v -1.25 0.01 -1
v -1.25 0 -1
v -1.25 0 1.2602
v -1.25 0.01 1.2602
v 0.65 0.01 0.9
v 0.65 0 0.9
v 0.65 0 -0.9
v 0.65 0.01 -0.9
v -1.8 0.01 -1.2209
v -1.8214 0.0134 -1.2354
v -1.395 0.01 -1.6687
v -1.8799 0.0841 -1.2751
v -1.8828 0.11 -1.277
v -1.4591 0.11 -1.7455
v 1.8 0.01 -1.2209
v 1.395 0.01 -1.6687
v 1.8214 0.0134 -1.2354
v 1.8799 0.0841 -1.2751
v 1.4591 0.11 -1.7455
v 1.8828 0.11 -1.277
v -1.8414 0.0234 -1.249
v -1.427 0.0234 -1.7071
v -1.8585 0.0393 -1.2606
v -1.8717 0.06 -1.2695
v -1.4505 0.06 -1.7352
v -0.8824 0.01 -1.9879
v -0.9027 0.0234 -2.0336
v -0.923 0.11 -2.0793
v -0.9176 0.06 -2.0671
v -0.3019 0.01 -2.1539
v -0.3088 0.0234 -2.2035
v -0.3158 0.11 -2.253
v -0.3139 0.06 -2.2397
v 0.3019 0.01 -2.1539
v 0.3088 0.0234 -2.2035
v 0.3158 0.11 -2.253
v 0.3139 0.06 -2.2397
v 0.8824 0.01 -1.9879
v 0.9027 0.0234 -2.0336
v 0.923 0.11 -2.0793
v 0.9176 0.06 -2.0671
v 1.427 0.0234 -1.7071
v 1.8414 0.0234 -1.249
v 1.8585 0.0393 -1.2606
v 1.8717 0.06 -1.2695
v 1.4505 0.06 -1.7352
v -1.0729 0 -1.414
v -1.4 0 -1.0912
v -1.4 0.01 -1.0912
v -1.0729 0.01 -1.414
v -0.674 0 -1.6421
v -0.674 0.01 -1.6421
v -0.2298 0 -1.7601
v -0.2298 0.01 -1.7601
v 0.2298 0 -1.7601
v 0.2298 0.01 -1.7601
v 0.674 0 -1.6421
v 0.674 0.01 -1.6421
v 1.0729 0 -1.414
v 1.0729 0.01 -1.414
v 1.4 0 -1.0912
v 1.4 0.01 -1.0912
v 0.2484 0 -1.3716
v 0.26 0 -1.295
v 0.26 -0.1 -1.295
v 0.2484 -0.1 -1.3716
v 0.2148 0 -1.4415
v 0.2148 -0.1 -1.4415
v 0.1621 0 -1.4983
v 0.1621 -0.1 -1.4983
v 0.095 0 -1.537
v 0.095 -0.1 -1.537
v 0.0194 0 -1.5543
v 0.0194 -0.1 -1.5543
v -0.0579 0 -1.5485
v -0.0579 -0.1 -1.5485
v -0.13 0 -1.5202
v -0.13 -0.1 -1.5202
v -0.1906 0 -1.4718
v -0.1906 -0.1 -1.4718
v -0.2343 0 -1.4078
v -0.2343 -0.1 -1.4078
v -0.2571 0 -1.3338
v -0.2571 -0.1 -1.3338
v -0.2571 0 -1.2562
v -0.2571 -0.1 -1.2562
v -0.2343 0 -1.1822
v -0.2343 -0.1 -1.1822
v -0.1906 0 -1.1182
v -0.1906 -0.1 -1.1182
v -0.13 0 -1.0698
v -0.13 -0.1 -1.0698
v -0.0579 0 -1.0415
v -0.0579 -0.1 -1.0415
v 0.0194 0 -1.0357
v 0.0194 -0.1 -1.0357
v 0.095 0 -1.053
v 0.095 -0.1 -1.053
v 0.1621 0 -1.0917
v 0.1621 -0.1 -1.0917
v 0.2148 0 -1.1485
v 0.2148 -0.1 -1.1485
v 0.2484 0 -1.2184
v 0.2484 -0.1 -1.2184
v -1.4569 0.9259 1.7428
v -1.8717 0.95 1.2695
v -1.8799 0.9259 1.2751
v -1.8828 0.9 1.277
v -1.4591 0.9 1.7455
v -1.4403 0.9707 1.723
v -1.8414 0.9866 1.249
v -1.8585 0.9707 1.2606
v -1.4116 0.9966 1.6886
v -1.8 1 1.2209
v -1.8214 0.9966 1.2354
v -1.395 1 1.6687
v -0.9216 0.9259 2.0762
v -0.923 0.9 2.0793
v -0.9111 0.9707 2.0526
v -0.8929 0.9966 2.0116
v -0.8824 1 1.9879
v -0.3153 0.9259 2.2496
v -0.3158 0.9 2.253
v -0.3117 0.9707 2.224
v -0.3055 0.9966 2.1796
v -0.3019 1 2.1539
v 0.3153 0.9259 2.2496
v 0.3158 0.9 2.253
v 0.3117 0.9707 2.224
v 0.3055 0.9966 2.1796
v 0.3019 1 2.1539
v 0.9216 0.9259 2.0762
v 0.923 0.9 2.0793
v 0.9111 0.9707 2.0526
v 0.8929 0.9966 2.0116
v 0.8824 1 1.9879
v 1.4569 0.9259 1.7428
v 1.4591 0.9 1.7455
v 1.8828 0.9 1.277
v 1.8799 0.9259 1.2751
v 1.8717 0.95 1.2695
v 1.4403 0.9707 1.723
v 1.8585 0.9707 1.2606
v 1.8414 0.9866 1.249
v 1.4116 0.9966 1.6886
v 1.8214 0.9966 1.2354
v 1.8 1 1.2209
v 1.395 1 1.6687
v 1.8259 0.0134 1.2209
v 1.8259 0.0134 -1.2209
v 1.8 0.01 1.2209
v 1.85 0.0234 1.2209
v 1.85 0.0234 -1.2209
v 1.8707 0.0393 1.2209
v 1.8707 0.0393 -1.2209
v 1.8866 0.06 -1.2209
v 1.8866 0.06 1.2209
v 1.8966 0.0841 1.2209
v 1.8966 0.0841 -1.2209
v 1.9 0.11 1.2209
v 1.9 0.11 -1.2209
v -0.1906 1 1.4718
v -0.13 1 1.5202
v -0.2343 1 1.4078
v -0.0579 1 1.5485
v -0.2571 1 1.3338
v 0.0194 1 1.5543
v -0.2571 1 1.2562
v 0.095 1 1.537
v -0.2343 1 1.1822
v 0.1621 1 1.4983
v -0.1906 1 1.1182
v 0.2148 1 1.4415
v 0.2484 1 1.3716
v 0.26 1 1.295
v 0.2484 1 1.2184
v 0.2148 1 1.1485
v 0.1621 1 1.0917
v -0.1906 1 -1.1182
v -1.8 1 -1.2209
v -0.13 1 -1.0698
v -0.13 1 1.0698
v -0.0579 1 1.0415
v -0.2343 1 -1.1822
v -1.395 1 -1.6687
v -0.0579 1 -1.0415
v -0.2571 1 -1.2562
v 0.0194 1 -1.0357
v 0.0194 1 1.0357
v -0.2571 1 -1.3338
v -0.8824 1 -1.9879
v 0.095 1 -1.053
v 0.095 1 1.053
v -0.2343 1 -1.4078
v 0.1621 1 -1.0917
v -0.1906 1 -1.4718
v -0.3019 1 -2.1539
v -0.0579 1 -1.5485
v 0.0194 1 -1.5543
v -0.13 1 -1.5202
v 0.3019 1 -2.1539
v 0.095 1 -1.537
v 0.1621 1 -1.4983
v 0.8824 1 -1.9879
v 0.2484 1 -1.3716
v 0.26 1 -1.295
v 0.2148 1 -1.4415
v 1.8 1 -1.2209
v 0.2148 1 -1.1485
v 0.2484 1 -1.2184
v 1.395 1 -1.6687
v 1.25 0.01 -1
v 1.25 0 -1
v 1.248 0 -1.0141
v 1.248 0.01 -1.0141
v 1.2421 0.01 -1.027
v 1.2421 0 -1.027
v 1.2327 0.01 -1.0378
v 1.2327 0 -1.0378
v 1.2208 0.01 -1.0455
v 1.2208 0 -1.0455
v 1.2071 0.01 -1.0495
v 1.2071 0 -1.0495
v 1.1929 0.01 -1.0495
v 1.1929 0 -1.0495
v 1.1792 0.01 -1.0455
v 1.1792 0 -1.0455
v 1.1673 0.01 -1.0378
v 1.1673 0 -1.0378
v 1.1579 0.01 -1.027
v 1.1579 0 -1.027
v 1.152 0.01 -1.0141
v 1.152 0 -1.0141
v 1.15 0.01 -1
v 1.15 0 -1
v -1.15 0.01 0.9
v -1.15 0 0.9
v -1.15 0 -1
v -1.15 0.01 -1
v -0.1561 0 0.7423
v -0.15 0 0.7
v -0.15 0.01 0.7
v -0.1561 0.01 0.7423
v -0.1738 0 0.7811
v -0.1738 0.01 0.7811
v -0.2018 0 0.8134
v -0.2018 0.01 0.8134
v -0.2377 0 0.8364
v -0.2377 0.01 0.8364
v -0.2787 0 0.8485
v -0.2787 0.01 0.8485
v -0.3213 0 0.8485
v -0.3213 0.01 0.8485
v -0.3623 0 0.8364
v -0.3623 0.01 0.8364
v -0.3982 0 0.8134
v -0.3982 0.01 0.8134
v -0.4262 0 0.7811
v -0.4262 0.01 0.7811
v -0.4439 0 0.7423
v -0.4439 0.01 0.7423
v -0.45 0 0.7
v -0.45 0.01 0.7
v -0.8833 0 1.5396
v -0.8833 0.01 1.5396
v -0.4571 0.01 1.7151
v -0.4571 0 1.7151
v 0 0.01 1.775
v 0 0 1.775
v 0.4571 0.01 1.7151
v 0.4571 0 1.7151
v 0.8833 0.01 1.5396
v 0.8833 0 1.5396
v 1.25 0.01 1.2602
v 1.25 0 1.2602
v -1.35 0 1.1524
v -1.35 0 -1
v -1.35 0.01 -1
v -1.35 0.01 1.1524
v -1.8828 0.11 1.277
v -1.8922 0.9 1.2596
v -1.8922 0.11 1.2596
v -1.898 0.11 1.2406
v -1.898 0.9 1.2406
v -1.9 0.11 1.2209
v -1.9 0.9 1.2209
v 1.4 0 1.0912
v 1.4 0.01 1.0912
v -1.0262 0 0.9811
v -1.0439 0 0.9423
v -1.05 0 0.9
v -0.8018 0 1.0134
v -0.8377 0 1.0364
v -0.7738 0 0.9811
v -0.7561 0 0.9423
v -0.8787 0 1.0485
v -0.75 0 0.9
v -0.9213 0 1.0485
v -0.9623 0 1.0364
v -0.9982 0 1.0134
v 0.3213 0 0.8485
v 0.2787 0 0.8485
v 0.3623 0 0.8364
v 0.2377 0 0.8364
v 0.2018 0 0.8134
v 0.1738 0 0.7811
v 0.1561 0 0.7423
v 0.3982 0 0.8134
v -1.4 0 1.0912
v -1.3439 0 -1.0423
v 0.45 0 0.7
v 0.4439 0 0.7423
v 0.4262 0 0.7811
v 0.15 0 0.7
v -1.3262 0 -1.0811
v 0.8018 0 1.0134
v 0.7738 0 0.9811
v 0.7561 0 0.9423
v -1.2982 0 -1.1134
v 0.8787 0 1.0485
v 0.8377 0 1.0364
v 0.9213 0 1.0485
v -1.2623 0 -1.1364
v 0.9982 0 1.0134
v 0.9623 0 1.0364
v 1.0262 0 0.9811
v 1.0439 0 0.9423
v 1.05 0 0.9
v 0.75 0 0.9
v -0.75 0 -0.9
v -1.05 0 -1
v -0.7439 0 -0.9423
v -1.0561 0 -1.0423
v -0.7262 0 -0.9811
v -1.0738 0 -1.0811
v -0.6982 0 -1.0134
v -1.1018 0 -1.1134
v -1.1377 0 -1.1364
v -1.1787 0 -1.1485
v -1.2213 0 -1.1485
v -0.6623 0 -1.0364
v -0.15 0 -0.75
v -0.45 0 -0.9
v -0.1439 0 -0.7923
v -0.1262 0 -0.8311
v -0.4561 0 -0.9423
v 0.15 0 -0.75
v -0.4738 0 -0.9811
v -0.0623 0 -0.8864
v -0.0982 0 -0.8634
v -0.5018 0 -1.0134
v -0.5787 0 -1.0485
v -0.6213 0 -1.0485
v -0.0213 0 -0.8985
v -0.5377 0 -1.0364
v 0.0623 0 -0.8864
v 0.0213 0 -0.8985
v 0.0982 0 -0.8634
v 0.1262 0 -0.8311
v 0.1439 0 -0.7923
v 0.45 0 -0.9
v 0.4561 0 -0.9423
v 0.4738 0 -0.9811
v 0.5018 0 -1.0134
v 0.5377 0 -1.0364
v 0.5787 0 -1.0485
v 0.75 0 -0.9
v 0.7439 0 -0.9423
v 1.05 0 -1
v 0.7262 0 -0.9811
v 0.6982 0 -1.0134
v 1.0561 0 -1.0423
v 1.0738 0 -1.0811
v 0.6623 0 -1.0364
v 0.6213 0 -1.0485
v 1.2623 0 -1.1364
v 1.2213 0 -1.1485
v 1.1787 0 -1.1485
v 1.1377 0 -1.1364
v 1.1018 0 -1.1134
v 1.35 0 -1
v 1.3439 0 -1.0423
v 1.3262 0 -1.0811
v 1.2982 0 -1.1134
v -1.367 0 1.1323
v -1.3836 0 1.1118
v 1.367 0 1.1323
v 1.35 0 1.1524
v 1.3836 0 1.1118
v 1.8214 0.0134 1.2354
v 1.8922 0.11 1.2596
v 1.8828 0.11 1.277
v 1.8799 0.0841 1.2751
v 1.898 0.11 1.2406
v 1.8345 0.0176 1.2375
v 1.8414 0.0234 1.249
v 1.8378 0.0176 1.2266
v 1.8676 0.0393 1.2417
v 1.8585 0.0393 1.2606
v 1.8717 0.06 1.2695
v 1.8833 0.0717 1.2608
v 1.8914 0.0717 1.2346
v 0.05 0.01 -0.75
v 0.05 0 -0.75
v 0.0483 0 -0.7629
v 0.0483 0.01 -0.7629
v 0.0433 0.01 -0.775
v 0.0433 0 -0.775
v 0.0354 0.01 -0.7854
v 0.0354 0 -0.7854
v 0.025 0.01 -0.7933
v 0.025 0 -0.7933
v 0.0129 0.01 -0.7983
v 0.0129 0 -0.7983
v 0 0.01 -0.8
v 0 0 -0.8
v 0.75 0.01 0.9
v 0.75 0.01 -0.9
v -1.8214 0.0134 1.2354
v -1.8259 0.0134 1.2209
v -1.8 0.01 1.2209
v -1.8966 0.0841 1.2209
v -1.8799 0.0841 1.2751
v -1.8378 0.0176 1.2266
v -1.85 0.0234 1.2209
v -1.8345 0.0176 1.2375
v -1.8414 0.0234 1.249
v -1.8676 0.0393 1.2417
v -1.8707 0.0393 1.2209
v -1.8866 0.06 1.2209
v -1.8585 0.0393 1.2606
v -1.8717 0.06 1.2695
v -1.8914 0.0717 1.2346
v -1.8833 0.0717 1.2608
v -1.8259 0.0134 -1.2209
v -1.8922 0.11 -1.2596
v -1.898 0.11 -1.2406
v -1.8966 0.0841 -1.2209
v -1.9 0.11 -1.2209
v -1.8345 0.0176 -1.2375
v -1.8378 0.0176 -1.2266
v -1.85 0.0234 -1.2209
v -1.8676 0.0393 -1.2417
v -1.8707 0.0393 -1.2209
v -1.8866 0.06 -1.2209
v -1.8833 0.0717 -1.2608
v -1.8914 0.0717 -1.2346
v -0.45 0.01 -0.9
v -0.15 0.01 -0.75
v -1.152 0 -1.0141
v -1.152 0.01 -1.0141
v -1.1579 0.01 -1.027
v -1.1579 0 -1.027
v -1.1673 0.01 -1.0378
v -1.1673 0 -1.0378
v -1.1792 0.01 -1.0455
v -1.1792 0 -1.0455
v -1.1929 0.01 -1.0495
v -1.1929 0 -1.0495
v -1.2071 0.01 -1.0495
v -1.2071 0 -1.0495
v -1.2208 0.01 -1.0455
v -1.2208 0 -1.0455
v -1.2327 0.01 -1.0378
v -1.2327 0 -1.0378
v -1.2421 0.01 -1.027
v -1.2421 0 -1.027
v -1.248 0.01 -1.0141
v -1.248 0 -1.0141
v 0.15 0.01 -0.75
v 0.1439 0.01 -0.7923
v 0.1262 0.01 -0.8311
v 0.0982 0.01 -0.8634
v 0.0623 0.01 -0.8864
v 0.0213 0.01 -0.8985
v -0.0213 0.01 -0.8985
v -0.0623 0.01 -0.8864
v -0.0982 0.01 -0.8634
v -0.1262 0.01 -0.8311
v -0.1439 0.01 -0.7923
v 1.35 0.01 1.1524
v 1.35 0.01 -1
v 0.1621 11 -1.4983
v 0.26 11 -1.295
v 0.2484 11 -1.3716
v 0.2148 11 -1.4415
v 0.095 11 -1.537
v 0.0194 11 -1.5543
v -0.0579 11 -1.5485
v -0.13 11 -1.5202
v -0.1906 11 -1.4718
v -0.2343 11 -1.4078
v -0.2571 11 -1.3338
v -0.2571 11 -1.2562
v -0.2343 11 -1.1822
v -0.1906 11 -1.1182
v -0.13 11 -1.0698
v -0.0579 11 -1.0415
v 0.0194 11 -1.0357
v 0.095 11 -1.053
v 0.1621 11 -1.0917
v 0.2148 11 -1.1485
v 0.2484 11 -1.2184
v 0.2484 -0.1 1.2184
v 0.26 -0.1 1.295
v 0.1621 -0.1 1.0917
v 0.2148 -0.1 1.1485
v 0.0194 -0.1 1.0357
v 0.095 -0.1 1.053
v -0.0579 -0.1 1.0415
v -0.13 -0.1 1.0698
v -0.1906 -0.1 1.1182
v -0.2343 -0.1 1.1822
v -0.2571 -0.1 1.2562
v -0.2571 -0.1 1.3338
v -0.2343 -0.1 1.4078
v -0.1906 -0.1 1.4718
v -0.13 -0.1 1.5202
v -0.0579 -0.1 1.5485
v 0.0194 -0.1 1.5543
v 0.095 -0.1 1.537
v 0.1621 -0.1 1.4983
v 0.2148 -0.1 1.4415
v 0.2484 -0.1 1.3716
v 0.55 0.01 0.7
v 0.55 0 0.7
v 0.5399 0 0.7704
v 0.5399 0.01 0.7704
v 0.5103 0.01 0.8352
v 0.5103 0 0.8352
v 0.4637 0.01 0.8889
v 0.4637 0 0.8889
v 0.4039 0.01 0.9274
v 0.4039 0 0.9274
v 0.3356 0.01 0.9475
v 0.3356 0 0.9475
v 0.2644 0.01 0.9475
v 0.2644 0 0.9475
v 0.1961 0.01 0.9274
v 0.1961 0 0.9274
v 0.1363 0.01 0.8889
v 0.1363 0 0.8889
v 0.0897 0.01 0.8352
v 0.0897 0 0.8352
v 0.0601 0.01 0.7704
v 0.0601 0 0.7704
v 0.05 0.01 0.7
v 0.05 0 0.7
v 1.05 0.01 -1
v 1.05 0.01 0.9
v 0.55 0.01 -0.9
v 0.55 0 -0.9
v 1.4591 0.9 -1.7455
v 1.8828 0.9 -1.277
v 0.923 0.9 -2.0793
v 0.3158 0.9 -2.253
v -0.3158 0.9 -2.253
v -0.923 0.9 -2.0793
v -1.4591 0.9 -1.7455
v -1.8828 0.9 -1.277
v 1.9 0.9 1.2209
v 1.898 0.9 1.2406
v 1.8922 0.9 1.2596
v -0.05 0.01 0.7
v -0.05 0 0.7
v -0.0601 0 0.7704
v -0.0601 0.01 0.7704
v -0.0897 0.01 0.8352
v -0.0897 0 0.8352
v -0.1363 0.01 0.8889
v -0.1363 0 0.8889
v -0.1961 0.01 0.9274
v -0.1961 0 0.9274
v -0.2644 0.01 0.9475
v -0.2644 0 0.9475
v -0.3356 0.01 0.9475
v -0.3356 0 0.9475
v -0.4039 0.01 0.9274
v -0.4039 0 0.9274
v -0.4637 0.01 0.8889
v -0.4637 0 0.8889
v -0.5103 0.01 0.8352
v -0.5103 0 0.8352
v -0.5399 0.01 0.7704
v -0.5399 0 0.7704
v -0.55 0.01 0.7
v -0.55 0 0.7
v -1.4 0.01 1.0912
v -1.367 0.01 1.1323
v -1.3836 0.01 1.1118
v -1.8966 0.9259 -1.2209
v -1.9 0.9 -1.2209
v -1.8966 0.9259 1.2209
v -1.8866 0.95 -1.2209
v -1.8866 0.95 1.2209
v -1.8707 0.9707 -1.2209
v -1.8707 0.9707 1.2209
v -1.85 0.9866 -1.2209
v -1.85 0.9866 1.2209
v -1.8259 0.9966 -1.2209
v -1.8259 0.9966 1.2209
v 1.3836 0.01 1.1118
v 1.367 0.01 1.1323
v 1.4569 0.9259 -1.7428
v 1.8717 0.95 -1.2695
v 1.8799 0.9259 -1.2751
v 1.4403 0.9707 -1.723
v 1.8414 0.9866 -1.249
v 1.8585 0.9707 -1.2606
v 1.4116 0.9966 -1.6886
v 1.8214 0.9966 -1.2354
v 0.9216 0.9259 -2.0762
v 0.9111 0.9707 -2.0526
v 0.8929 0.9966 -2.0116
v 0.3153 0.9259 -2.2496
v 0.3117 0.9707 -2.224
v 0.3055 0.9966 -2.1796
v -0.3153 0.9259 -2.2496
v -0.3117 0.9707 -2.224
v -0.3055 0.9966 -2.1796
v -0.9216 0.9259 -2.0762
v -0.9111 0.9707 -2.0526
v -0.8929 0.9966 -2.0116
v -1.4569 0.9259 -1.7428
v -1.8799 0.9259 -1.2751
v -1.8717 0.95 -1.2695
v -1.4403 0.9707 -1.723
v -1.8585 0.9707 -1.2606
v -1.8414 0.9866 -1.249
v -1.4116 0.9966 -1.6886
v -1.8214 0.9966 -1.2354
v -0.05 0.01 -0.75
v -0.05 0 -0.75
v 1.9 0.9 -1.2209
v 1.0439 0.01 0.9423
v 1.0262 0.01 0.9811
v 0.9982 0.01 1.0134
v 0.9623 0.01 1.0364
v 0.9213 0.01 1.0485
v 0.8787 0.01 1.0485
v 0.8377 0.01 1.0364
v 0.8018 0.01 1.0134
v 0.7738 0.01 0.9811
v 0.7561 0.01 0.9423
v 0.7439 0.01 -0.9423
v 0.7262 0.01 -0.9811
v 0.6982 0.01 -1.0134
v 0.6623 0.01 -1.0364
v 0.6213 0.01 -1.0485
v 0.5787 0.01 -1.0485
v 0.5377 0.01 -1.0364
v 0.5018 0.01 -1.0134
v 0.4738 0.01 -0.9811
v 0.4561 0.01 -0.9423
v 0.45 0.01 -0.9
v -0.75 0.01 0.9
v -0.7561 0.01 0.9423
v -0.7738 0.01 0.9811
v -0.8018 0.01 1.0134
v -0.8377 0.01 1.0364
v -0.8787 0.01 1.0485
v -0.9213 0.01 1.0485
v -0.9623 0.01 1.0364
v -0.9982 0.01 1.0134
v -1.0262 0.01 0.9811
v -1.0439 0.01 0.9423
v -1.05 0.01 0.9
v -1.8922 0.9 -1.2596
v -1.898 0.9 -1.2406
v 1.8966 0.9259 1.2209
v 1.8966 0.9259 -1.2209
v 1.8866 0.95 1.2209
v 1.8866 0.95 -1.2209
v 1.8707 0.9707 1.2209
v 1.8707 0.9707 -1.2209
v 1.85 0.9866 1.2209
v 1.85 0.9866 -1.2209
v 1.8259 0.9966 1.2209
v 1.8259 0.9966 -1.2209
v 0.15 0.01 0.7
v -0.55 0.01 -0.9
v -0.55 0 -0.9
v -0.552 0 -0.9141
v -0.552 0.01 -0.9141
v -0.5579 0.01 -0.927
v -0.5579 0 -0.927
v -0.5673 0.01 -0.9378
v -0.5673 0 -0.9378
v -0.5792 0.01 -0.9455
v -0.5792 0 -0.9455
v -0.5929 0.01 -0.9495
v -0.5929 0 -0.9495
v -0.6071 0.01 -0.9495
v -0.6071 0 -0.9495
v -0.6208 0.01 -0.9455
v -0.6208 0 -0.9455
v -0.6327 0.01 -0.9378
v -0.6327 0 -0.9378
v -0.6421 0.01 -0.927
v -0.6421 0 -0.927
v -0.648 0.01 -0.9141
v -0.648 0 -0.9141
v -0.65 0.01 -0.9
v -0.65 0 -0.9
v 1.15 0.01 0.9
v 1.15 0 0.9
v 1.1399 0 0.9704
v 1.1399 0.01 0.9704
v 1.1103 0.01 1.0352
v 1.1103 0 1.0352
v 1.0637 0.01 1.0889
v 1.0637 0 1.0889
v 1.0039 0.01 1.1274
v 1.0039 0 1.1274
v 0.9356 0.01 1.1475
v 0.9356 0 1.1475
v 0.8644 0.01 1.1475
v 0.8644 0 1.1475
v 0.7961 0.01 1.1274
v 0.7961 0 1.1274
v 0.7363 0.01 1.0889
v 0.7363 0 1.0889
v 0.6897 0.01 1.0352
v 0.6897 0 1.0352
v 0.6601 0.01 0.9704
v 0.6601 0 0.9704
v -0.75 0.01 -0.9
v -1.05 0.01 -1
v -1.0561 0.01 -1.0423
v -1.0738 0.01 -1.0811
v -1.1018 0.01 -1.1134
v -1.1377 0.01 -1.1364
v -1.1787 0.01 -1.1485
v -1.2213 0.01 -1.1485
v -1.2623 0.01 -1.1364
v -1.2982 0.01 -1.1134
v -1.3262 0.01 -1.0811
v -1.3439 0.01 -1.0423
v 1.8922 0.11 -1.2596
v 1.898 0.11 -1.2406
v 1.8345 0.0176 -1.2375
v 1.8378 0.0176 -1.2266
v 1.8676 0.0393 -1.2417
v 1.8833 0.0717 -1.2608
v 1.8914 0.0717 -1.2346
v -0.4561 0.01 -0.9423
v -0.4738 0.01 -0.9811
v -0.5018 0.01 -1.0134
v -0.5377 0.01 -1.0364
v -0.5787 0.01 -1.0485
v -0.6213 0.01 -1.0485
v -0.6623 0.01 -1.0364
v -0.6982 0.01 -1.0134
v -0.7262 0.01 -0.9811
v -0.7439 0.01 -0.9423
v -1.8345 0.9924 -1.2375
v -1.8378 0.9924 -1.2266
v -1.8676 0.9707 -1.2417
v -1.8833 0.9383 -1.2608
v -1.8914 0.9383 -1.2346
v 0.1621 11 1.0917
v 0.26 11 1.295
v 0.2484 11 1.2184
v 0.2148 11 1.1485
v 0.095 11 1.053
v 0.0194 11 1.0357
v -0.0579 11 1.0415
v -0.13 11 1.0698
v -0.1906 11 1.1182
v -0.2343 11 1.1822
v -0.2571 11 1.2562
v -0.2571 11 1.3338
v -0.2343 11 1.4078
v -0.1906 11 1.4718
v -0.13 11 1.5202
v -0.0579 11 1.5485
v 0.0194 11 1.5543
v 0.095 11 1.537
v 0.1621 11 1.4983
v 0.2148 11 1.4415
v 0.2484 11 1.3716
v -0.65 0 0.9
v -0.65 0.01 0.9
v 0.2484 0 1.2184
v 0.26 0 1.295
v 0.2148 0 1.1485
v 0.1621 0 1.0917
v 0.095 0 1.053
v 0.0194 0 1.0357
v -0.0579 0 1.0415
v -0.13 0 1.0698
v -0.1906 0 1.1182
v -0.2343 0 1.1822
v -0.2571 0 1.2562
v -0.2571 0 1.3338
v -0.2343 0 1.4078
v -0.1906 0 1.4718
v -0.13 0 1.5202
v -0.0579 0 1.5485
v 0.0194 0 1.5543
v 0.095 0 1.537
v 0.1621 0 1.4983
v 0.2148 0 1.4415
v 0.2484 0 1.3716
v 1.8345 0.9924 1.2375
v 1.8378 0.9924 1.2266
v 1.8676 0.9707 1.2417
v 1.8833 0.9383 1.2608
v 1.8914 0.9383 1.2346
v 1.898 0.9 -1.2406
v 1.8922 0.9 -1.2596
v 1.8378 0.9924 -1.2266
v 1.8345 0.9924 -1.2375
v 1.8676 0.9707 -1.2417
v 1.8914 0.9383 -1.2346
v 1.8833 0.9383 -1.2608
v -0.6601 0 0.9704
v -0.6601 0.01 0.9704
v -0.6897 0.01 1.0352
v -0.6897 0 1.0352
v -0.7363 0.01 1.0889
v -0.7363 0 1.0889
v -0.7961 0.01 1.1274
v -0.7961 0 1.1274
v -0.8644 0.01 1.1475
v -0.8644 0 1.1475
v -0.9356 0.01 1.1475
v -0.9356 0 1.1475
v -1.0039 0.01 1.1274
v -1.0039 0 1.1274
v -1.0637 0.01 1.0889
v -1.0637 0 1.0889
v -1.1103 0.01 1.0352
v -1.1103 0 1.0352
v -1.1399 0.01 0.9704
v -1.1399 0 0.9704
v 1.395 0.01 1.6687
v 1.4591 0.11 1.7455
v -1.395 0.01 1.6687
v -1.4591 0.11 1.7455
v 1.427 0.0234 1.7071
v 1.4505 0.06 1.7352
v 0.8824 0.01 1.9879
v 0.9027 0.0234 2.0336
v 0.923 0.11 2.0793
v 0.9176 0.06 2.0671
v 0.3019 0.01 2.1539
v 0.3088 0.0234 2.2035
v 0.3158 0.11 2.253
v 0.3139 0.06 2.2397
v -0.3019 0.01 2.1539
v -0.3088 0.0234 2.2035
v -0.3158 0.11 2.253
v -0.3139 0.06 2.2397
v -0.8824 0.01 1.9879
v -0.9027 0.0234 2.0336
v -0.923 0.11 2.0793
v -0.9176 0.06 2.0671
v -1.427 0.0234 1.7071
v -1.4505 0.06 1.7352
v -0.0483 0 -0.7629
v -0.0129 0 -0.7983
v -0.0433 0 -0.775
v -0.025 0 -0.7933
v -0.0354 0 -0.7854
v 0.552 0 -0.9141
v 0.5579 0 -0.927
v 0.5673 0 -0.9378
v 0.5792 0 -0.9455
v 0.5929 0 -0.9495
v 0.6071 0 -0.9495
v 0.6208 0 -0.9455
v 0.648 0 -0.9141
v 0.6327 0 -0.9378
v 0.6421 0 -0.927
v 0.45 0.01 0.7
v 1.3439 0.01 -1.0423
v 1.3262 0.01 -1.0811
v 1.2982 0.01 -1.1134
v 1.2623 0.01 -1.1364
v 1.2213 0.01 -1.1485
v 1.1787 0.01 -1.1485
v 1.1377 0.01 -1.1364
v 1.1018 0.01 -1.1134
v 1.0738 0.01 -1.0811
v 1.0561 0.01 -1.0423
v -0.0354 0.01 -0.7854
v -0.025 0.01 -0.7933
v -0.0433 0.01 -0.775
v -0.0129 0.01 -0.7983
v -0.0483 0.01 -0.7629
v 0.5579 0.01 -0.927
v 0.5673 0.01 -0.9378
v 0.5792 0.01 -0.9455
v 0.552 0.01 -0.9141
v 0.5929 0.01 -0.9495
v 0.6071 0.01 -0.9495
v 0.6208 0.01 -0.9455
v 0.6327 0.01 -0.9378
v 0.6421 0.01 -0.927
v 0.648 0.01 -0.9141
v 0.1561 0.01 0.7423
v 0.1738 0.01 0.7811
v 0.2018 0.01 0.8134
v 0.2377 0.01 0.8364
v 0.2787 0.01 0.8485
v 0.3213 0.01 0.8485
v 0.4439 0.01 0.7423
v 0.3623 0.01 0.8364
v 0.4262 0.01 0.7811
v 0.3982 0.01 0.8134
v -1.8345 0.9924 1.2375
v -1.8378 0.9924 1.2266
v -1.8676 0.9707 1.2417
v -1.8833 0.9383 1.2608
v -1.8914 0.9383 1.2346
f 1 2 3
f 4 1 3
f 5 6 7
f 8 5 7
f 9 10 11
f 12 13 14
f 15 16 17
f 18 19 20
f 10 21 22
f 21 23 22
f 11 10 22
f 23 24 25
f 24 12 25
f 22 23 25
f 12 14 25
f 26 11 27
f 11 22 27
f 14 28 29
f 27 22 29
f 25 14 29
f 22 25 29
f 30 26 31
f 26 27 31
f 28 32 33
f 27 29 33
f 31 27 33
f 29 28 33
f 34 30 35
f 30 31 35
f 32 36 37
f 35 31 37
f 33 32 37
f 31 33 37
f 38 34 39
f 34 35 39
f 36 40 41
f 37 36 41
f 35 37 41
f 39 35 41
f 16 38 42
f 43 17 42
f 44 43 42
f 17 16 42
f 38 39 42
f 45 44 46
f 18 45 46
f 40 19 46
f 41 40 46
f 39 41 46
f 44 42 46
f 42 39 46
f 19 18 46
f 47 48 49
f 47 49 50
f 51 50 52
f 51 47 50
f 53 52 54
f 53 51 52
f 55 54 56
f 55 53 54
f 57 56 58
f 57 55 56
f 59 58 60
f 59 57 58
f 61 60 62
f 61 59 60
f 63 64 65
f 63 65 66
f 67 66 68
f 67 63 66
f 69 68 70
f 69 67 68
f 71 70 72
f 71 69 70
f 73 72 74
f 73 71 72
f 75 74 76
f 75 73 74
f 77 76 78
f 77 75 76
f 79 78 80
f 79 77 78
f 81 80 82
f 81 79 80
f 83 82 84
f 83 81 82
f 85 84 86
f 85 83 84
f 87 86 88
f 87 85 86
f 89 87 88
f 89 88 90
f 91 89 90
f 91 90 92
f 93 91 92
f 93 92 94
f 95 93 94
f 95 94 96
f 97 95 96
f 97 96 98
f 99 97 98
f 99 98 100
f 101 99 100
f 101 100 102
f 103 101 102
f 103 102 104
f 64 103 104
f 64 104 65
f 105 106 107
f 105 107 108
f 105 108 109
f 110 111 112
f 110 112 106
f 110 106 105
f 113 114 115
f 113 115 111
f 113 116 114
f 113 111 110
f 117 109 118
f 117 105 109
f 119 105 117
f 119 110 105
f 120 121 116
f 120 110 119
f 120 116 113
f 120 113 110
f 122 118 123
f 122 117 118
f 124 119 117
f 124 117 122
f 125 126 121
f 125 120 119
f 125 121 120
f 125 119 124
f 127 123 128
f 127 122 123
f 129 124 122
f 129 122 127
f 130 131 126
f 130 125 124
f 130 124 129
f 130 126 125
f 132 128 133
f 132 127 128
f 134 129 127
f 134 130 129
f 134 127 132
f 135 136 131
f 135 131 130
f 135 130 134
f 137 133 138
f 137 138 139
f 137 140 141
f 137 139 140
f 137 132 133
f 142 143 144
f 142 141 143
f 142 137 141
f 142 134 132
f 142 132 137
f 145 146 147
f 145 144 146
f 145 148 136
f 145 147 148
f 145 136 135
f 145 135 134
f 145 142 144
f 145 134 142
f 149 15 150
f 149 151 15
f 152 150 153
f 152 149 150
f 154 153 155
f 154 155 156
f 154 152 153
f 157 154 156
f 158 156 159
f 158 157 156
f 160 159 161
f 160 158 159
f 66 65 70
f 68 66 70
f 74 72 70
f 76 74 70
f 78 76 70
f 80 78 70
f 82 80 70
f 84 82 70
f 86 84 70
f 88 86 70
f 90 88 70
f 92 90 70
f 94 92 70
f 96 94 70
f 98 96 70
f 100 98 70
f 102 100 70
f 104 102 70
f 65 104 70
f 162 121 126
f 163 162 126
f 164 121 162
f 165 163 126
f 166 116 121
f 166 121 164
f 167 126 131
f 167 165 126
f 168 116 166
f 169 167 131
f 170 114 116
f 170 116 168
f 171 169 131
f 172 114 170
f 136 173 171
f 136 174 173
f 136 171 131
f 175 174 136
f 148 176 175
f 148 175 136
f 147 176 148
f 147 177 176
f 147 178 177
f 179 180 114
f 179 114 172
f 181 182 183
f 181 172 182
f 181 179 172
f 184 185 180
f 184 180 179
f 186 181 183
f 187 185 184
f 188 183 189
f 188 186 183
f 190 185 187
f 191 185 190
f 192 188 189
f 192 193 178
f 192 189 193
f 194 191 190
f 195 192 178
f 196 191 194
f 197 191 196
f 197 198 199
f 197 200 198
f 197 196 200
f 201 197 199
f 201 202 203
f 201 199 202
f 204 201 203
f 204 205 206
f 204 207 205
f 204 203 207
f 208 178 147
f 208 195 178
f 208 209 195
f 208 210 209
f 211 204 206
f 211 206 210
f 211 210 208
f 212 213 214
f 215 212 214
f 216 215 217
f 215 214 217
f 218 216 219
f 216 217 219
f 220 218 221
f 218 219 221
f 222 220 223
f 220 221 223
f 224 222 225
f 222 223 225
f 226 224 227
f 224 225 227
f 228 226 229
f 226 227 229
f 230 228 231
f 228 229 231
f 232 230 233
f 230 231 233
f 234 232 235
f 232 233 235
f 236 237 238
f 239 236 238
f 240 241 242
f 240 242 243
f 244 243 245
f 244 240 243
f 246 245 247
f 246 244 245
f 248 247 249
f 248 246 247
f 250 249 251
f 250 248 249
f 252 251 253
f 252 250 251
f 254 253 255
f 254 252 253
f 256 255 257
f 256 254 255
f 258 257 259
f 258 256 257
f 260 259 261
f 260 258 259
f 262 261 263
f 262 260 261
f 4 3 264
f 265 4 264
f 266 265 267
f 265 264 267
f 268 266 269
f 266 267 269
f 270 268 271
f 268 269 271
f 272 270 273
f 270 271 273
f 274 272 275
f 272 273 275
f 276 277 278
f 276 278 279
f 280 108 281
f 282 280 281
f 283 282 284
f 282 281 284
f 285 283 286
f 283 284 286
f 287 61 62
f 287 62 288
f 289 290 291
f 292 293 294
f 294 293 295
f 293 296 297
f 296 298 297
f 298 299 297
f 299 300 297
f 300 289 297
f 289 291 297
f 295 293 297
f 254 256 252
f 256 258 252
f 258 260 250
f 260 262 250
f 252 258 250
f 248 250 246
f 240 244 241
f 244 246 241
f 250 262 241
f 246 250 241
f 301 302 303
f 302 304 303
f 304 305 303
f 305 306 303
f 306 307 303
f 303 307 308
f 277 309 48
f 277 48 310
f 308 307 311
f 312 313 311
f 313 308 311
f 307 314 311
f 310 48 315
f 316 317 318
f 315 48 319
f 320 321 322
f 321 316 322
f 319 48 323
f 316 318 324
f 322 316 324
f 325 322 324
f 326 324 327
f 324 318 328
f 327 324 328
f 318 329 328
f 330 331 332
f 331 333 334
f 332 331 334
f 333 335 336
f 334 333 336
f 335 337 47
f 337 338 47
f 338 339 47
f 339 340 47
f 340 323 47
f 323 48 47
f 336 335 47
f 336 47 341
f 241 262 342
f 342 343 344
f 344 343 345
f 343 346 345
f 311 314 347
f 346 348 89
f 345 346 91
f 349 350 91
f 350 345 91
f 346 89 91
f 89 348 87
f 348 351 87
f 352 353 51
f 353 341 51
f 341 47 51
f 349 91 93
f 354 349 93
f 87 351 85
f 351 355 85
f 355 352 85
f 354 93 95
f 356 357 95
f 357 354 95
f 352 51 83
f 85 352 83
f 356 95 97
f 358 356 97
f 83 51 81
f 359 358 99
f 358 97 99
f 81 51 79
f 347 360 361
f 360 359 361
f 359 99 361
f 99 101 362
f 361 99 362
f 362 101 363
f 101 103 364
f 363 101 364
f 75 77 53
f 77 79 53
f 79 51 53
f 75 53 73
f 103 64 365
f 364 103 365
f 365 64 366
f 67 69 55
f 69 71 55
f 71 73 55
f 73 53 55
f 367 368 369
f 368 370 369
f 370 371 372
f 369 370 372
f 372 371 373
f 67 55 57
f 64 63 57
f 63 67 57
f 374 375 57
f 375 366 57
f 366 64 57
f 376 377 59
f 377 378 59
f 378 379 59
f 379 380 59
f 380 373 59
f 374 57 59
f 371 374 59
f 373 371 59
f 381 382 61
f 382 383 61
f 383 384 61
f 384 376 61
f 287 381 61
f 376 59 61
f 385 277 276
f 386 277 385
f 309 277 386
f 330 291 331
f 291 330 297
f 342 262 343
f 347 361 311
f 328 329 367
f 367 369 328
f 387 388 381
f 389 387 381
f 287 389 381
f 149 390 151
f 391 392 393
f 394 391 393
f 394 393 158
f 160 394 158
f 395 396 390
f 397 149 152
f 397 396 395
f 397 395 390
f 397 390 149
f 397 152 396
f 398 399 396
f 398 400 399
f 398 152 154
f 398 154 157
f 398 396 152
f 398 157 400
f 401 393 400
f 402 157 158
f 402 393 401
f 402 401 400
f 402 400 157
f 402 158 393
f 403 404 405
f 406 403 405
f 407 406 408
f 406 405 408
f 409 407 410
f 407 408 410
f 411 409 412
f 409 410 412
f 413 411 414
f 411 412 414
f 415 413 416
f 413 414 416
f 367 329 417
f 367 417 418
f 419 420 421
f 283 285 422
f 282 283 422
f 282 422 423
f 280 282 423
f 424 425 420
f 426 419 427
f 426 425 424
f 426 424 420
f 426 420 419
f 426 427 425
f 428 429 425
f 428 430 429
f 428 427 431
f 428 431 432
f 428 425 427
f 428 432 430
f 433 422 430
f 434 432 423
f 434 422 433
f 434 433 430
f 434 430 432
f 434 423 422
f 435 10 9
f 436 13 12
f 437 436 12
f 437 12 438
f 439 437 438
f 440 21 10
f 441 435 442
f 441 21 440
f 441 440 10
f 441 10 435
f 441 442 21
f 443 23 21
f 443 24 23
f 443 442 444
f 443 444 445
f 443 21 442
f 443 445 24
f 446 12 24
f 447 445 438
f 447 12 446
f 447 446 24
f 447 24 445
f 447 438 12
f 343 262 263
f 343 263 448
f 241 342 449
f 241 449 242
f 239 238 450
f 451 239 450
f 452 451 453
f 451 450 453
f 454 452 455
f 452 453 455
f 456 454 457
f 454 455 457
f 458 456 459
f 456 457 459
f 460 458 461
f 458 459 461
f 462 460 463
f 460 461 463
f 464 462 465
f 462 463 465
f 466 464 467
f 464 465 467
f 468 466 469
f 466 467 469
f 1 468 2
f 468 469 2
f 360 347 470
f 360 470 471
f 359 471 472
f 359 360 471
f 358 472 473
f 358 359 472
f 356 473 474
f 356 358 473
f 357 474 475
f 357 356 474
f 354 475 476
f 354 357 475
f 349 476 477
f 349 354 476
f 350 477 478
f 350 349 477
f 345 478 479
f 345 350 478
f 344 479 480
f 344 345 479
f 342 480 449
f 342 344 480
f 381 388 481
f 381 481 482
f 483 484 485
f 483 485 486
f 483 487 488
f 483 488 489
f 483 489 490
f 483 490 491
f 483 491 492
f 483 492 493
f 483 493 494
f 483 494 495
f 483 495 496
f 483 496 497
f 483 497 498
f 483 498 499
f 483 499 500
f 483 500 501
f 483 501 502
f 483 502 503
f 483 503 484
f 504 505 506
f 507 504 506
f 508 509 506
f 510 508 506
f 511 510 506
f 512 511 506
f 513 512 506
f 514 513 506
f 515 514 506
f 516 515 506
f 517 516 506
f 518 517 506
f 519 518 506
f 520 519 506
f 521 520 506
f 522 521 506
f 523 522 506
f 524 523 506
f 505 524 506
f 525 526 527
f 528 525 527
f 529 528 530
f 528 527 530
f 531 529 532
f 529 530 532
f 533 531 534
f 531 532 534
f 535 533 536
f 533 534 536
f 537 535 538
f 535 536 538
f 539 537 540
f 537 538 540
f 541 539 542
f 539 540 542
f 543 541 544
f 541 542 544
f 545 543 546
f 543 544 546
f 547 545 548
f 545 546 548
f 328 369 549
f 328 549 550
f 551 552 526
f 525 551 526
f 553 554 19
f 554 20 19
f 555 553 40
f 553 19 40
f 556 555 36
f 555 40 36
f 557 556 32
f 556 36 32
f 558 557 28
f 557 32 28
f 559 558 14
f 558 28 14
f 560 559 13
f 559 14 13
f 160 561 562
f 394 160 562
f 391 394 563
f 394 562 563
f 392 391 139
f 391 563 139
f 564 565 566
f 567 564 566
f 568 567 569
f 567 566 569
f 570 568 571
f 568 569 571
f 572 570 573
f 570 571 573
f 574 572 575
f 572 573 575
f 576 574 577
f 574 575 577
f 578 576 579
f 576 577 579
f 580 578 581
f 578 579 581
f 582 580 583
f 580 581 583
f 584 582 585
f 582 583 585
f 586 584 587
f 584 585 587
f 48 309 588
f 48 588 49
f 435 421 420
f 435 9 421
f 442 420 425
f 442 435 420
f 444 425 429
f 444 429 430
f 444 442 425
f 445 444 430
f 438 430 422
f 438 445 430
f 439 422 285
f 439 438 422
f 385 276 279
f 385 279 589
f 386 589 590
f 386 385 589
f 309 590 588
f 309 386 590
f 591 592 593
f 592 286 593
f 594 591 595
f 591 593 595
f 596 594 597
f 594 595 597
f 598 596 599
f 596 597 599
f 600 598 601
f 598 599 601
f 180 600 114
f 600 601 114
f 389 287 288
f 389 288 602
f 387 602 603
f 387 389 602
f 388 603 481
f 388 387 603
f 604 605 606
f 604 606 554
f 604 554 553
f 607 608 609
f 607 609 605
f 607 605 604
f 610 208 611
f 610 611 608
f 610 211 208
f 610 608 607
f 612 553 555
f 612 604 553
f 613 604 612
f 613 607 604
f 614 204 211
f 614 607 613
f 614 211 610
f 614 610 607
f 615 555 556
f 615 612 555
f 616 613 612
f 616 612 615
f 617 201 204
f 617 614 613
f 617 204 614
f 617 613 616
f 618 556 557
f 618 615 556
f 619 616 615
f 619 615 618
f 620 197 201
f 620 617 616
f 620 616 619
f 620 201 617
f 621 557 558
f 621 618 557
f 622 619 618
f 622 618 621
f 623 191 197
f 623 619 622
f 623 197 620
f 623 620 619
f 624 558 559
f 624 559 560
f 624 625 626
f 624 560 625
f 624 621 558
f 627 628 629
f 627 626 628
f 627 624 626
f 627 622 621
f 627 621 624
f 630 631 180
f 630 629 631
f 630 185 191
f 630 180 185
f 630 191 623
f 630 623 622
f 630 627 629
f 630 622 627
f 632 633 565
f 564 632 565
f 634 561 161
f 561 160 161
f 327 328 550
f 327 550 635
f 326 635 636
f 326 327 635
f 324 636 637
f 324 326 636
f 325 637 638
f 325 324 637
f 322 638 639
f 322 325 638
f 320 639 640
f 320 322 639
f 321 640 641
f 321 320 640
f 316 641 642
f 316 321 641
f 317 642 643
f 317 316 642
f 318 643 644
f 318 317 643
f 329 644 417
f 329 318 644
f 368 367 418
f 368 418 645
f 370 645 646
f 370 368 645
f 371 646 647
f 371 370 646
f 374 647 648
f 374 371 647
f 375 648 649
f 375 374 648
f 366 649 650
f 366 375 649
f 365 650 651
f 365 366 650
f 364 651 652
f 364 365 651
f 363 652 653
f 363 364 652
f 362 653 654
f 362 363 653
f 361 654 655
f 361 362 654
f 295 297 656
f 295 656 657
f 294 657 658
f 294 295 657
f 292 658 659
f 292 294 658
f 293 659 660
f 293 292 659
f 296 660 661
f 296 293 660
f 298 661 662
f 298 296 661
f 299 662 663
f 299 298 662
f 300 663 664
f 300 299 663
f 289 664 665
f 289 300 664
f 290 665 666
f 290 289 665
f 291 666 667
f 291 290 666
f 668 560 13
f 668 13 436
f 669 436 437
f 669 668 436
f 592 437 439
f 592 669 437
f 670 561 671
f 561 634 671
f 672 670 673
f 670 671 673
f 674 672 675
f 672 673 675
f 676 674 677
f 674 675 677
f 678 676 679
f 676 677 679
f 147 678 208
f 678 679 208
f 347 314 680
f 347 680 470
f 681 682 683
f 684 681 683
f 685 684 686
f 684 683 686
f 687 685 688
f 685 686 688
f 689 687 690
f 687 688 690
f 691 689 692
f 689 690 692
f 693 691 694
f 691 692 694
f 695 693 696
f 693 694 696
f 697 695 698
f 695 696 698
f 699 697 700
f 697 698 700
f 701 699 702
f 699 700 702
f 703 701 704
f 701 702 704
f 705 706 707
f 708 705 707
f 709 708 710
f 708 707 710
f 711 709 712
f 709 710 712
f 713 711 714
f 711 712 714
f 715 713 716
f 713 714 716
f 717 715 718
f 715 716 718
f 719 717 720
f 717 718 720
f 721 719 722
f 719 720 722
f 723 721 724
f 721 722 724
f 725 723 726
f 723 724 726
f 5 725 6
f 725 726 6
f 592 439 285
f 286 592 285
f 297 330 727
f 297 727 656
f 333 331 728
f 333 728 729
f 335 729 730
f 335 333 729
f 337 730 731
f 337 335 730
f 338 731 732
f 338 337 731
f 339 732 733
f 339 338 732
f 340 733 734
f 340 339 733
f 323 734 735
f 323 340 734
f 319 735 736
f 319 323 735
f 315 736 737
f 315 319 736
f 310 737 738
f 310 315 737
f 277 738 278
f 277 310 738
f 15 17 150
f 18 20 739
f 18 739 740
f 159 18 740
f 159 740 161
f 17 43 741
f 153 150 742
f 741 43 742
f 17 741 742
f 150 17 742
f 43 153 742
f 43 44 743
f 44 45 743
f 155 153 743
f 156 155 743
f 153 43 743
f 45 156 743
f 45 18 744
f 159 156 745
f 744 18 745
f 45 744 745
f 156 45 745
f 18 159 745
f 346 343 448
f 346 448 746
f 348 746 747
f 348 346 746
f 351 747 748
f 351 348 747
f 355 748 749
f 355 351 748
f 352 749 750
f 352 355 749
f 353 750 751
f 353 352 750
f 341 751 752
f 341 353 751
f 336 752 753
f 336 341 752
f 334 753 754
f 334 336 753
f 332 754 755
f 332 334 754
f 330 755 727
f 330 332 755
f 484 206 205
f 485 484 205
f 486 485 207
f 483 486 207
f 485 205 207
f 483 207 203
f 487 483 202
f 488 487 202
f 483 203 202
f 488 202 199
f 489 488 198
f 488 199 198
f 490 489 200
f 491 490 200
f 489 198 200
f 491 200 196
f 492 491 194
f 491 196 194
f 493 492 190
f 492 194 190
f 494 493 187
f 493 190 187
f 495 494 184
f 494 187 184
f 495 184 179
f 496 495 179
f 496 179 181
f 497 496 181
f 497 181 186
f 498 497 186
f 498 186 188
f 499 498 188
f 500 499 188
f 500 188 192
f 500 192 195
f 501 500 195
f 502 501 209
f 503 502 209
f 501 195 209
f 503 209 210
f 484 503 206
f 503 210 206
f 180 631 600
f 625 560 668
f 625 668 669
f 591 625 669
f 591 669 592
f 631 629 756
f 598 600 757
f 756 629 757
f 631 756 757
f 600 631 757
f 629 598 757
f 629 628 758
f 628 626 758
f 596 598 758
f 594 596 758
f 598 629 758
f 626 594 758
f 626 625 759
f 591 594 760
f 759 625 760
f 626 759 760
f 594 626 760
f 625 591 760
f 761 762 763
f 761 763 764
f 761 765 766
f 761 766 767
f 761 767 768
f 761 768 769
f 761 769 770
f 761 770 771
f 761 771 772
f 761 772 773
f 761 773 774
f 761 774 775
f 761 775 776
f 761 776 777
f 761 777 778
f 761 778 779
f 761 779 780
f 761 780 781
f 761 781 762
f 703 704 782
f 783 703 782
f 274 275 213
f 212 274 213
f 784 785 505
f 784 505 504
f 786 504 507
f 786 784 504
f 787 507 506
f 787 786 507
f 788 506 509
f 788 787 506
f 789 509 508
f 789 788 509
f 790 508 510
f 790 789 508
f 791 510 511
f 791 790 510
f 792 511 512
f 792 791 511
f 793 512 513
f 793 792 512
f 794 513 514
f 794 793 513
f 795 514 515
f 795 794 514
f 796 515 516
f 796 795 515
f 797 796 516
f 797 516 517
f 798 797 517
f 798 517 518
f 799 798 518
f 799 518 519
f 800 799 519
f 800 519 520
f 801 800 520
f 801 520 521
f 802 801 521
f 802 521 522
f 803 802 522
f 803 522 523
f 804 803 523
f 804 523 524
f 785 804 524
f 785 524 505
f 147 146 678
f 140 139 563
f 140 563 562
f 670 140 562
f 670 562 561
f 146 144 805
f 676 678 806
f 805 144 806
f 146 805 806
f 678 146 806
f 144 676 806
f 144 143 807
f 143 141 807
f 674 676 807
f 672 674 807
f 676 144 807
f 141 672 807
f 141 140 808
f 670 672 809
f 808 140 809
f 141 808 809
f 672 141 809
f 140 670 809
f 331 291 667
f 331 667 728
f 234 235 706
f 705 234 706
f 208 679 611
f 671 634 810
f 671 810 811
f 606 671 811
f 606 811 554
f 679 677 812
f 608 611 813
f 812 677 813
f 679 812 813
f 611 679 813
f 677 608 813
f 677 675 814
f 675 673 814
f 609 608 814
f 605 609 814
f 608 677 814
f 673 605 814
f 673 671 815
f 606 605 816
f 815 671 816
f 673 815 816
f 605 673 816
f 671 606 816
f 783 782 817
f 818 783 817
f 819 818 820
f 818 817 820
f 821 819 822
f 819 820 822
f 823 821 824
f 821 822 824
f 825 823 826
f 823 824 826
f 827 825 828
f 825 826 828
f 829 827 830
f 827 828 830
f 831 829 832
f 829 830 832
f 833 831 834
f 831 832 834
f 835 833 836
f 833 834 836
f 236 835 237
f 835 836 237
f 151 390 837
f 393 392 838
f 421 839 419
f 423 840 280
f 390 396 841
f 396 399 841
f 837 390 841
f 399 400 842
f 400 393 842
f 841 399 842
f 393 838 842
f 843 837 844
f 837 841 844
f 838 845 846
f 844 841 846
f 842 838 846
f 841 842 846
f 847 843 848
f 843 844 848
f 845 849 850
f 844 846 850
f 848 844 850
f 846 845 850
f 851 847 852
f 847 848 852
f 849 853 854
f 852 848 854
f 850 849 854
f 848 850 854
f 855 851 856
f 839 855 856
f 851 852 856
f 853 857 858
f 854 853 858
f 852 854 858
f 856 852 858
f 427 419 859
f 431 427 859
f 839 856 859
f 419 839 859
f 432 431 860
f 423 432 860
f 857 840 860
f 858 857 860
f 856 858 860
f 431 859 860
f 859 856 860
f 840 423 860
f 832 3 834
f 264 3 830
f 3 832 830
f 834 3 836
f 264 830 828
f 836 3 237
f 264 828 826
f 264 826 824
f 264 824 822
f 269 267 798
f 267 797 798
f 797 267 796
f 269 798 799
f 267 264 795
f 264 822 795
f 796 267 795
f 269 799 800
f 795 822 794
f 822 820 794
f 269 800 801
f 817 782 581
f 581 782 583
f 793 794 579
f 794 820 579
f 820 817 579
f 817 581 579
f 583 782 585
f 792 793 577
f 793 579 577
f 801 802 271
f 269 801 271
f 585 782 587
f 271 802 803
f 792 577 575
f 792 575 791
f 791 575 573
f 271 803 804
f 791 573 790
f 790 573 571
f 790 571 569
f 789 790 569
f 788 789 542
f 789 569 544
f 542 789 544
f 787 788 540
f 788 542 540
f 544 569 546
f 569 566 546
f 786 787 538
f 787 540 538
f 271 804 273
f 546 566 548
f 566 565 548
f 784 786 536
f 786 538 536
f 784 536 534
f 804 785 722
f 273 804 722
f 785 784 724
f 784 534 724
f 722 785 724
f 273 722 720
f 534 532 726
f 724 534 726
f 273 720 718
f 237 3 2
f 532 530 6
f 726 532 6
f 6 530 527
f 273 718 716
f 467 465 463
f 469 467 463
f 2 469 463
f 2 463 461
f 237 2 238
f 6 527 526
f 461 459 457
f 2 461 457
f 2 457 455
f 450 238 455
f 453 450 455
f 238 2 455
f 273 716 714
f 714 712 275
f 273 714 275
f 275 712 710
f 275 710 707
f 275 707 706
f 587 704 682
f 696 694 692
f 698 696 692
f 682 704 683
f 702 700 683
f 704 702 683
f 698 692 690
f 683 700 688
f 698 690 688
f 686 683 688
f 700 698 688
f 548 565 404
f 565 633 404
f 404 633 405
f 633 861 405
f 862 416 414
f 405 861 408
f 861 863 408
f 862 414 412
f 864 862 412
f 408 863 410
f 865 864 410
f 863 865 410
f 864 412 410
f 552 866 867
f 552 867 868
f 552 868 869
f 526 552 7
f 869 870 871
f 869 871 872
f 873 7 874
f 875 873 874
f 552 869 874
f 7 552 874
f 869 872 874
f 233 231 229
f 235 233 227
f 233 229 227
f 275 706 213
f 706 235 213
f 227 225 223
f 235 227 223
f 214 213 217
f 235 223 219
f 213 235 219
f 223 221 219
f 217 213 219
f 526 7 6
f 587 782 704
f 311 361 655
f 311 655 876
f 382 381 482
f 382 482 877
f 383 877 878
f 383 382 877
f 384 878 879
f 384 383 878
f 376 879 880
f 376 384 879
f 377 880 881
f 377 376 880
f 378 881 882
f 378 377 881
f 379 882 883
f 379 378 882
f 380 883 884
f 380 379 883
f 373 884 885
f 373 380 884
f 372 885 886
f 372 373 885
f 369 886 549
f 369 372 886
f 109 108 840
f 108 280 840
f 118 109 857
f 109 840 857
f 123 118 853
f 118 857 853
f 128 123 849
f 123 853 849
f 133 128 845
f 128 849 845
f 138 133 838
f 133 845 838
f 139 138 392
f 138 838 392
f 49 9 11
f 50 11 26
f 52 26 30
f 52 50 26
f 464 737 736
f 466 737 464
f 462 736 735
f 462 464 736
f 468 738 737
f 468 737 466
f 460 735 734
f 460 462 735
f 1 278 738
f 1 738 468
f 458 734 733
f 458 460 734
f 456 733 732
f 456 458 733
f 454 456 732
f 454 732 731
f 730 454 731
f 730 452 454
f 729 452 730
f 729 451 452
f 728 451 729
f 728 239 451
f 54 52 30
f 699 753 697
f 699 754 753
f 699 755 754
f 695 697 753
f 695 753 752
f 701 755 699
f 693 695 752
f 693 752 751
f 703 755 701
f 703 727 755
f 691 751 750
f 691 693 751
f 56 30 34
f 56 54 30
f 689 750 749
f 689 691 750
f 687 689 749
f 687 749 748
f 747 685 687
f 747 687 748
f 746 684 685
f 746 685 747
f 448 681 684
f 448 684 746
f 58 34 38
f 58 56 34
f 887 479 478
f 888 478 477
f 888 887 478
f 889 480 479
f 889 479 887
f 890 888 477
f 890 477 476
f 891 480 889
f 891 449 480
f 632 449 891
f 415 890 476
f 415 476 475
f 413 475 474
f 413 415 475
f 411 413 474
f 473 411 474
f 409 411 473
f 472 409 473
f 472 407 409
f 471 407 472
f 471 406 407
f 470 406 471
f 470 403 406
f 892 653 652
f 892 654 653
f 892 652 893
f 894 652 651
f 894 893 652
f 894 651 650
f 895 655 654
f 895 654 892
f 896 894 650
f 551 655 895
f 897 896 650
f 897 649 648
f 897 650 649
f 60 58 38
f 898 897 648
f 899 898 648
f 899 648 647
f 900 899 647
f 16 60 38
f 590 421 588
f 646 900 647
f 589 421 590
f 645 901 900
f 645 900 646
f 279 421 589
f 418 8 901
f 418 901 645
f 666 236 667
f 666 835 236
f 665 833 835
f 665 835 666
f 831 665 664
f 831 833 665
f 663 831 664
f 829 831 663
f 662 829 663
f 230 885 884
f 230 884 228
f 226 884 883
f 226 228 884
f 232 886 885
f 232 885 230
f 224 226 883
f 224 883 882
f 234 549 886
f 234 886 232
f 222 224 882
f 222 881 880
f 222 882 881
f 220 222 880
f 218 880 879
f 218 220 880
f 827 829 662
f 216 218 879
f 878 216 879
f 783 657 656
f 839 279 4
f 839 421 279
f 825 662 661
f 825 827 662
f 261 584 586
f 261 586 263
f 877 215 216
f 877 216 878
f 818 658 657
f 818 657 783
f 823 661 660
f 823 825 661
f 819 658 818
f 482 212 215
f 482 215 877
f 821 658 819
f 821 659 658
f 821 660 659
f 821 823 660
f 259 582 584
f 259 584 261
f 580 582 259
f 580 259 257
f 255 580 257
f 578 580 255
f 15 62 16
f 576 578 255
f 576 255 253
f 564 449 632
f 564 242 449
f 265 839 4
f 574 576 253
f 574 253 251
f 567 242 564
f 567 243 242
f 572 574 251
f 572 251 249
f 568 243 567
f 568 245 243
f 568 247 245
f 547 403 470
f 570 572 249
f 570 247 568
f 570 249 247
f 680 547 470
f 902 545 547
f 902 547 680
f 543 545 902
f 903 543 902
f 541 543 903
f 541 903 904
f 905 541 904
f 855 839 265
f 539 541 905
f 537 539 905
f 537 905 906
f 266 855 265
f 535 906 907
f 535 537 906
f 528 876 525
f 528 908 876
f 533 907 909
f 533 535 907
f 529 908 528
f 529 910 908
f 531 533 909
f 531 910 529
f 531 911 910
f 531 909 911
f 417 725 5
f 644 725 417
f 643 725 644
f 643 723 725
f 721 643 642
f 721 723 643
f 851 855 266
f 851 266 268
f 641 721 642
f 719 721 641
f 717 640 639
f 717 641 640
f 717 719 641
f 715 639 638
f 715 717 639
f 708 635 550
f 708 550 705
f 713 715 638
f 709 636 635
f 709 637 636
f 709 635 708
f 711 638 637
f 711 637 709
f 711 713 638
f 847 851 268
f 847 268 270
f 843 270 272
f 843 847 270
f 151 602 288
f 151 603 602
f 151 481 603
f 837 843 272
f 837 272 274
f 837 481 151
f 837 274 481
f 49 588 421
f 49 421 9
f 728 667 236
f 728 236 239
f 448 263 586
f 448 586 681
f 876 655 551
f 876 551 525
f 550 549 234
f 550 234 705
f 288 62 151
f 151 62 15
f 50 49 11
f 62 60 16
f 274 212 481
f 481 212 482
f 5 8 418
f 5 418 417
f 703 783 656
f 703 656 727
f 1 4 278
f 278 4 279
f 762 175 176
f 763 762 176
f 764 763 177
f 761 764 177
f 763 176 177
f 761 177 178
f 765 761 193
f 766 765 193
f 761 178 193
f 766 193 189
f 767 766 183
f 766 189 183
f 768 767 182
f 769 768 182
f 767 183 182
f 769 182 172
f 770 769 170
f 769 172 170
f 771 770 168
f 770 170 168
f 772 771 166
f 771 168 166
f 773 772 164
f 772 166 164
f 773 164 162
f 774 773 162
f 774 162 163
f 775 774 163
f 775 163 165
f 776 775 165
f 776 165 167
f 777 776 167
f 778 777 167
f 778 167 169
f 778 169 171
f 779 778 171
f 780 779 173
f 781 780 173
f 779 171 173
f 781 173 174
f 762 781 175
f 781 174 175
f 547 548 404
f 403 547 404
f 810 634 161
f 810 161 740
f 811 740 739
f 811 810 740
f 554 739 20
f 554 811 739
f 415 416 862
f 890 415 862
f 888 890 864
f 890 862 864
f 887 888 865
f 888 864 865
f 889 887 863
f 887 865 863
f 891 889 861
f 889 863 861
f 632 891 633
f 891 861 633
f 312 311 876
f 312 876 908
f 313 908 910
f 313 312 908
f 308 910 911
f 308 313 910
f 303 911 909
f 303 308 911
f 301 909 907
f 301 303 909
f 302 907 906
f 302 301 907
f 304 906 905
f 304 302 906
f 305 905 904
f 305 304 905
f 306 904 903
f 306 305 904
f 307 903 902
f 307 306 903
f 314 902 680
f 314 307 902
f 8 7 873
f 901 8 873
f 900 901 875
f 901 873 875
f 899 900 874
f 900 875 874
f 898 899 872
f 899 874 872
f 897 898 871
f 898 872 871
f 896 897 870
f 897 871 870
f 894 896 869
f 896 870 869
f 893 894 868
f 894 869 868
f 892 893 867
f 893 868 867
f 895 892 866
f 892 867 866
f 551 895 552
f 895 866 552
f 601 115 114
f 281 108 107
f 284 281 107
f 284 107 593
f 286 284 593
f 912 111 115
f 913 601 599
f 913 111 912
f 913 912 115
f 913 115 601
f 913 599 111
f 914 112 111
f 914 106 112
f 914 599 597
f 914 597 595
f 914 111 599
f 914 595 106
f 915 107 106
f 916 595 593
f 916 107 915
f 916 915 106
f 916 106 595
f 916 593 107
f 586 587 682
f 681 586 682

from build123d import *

# Parameters (mm, degrees)
BOSS_EXTRUDE1_DEPTH      = 1
SKETCH2_R                = 0.26
BOSS_EXTRUDE2_DEPTH      = 10
BOSS_EXTRUDE2_DEPTH_BACK = 1.1
CUT_EXTRUDE1_DEPTH       = 0.01
FILLET1_R                = 0.1


with BuildPart() as part:
    # Sketch1 → Boss-Extrude1 (new body)
    with BuildSketch(Plane(origin=(0, 0, 0), x_dir=(1, 0, 0), z_dir=(0, 1, 0))):
        with BuildLine():
            Line((-1.9, 1.251249376), (-1.9, -1.251249376))
            ThreePointArc((-1.9, -1.251249376), (0, -2.275), (1.9, -1.251249376))
            Line((1.9, -1.251249376), (1.9, 1.251249376))
            ThreePointArc((1.9, 1.251249376), (0, 2.275), (-1.9, 1.251249376))
        make_face()
    extrude(amount=BOSS_EXTRUDE1_DEPTH)

    # Sketch2 → Boss-Extrude2 (add, two sides)
    with BuildSketch(Plane(origin=(0, 1, 0), x_dir=(1, 0, 0), z_dir=(0, 1, 0))) as boss_extrude2_sk:
        with Locations((0, 1.295)):
            Circle(SKETCH2_R)
        with Locations((0, -1.295)):
            Circle(SKETCH2_R)
    extrude(amount=BOSS_EXTRUDE2_DEPTH)
    extrude(boss_extrude2_sk.sketch, amount=-BOSS_EXTRUDE2_DEPTH_BACK)

    # Sketch4 → Cut-Extrude1 (cut)
    with BuildSketch(Plane.XZ):
        with BuildLine():
            Line((1.9, -1.251249376), (1.9, 1.251249376))
            ThreePointArc((1.9, 1.251249376), (0, 2.275), (-1.9, 1.251249376))
            Line((-1.9, 1.251249376), (-1.9, -1.251249376))
            ThreePointArc((-1.9, -1.251249376), (0, -2.275), (1.9, -1.251249376))
        make_face()
        with BuildLine():
            Line((-1.4, 1.091157642), (-1.4, -1.091157642))
            ThreePointArc((-1.4, -1.091157642), (0, -1.775), (1.4, -1.091157642))
            Line((1.4, -1.091157642), (1.4, 1.091157642))
            ThreePointArc((1.4, 1.091157642), (1.375341403, 1.122078885), (1.35, 1.152443057))
            Line((1.35, 1.152443057), (1.35, -1))
            ThreePointArc((1.35, -1), (1.2, -1.15), (1.05, -1))
            Line((1.05, -1), (1.05, 0.9))
            ThreePointArc((1.05, 0.9), (0.9, 1.05), (0.75, 0.9))
            Line((0.75, 0.9), (0.75, -0.9))
            ThreePointArc((0.75, -0.9), (0.6, -1.05), (0.45, -0.9))
            Line((0.45, -0.9), (0.45, 0.7))
            ThreePointArc((0.45, 0.7), (0.3, 0.85), (0.15, 0.7))
            Line((0.15, 0.7), (0.15, -0.75))
            ThreePointArc((0.15, -0.75), (0, -0.9), (-0.15, -0.75))
            Line((-0.15, -0.75), (-0.15, 0.7))
            ThreePointArc((-0.15, 0.7), (-0.3, 0.85), (-0.45, 0.7))
            Line((-0.45, 0.7), (-0.45, -0.9))
            ThreePointArc((-0.45, -0.9), (-0.6, -1.05), (-0.75, -0.9))
            Line((-0.75, -0.9), (-0.75, 0.9))
            ThreePointArc((-0.75, 0.9), (-0.9, 1.05), (-1.05, 0.9))
            Line((-1.05, 0.9), (-1.05, -1))
            ThreePointArc((-1.05, -1), (-1.2, -1.15), (-1.35, -1))
            Line((-1.35, -1), (-1.35, 1.152443057))
            ThreePointArc((-1.35, 1.152443057), (-1.375341403, 1.122078885), (-1.4, 1.091157642))
        make_face(mode=Mode.SUBTRACT)
        with BuildLine():
            Line((1.25, 1.152443057), (1.25, -1))
            ThreePointArc((1.25, -1), (1.2, -1.05), (1.15, -1))
            Line((1.15, -1), (1.15, 0.9))
            ThreePointArc((1.15, 0.9), (0.9, 1.15), (0.65, 0.9))
            Line((0.65, 0.9), (0.65, -0.9))
            ThreePointArc((0.65, -0.9), (0.6, -0.95), (0.55, -0.9))
            Line((0.55, -0.9), (0.55, 0.7))
            ThreePointArc((0.55, 0.7), (0.3, 0.95), (0.05, 0.7))
            Line((0.05, 0.7), (0.05, -0.75))
            ThreePointArc((0.05, -0.75), (0.035355339, -0.785355339), (0, -0.8))
            ThreePointArc((0, -0.8), (-0.035355339, -0.785355339), (-0.05, -0.75))
            Line((-0.05, -0.75), (-0.05, 0.7))
            ThreePointArc((-0.05, 0.7), (-0.3, 0.95), (-0.55, 0.7))
            Line((-0.55, 0.7), (-0.55, -0.9))
            ThreePointArc((-0.55, -0.9), (-0.6, -0.95), (-0.65, -0.9))
            Line((-0.65, -0.9), (-0.65, 0.9))
            ThreePointArc((-0.65, 0.9), (-0.9, 1.15), (-1.15, 0.9))
            Line((-1.15, 0.9), (-1.15, -1))
            ThreePointArc((-1.15, -1), (-1.2, -1.05), (-1.25, -1))
            Line((-1.25, -1), (-1.25, 1.152443057))
            Line((-1.25, 1.152443057), (-1.25, 1.260208316))
            ThreePointArc((-1.25, 1.260208316), (0, 1.775), (1.25, 1.260208316))
            Line((1.25, 1.260208316), (1.25, 1.152443057))
        make_face(mode=Mode.SUBTRACT)
    extrude(amount=-CUT_EXTRUDE1_DEPTH, mode=Mode.SUBTRACT)

    # Fillet1
    fillet1_edges = [part.edges().sort_by_distance(p)[0] for p in [
        (0, 1, 2.275),
        (1.9, 1, 0),
        (0, 1, -2.275),
        (0, 0.01, -2.275),
        (-1.9, 0.01, 0),
        (0, 0.01, 2.275),
        (1.9, 0.01, 0),
        (-1.9, 1, 0),
        (1.9, 0.505, -1.251249376),
        (1.9, 0.505, 1.251249376),
        (-1.9, 0.505, 1.251249376),
        (-1.9, 0.505, -1.251249376),
    ]]
    fillet(fillet1_edges, radius=FILLET1_R)


solid = part.part
